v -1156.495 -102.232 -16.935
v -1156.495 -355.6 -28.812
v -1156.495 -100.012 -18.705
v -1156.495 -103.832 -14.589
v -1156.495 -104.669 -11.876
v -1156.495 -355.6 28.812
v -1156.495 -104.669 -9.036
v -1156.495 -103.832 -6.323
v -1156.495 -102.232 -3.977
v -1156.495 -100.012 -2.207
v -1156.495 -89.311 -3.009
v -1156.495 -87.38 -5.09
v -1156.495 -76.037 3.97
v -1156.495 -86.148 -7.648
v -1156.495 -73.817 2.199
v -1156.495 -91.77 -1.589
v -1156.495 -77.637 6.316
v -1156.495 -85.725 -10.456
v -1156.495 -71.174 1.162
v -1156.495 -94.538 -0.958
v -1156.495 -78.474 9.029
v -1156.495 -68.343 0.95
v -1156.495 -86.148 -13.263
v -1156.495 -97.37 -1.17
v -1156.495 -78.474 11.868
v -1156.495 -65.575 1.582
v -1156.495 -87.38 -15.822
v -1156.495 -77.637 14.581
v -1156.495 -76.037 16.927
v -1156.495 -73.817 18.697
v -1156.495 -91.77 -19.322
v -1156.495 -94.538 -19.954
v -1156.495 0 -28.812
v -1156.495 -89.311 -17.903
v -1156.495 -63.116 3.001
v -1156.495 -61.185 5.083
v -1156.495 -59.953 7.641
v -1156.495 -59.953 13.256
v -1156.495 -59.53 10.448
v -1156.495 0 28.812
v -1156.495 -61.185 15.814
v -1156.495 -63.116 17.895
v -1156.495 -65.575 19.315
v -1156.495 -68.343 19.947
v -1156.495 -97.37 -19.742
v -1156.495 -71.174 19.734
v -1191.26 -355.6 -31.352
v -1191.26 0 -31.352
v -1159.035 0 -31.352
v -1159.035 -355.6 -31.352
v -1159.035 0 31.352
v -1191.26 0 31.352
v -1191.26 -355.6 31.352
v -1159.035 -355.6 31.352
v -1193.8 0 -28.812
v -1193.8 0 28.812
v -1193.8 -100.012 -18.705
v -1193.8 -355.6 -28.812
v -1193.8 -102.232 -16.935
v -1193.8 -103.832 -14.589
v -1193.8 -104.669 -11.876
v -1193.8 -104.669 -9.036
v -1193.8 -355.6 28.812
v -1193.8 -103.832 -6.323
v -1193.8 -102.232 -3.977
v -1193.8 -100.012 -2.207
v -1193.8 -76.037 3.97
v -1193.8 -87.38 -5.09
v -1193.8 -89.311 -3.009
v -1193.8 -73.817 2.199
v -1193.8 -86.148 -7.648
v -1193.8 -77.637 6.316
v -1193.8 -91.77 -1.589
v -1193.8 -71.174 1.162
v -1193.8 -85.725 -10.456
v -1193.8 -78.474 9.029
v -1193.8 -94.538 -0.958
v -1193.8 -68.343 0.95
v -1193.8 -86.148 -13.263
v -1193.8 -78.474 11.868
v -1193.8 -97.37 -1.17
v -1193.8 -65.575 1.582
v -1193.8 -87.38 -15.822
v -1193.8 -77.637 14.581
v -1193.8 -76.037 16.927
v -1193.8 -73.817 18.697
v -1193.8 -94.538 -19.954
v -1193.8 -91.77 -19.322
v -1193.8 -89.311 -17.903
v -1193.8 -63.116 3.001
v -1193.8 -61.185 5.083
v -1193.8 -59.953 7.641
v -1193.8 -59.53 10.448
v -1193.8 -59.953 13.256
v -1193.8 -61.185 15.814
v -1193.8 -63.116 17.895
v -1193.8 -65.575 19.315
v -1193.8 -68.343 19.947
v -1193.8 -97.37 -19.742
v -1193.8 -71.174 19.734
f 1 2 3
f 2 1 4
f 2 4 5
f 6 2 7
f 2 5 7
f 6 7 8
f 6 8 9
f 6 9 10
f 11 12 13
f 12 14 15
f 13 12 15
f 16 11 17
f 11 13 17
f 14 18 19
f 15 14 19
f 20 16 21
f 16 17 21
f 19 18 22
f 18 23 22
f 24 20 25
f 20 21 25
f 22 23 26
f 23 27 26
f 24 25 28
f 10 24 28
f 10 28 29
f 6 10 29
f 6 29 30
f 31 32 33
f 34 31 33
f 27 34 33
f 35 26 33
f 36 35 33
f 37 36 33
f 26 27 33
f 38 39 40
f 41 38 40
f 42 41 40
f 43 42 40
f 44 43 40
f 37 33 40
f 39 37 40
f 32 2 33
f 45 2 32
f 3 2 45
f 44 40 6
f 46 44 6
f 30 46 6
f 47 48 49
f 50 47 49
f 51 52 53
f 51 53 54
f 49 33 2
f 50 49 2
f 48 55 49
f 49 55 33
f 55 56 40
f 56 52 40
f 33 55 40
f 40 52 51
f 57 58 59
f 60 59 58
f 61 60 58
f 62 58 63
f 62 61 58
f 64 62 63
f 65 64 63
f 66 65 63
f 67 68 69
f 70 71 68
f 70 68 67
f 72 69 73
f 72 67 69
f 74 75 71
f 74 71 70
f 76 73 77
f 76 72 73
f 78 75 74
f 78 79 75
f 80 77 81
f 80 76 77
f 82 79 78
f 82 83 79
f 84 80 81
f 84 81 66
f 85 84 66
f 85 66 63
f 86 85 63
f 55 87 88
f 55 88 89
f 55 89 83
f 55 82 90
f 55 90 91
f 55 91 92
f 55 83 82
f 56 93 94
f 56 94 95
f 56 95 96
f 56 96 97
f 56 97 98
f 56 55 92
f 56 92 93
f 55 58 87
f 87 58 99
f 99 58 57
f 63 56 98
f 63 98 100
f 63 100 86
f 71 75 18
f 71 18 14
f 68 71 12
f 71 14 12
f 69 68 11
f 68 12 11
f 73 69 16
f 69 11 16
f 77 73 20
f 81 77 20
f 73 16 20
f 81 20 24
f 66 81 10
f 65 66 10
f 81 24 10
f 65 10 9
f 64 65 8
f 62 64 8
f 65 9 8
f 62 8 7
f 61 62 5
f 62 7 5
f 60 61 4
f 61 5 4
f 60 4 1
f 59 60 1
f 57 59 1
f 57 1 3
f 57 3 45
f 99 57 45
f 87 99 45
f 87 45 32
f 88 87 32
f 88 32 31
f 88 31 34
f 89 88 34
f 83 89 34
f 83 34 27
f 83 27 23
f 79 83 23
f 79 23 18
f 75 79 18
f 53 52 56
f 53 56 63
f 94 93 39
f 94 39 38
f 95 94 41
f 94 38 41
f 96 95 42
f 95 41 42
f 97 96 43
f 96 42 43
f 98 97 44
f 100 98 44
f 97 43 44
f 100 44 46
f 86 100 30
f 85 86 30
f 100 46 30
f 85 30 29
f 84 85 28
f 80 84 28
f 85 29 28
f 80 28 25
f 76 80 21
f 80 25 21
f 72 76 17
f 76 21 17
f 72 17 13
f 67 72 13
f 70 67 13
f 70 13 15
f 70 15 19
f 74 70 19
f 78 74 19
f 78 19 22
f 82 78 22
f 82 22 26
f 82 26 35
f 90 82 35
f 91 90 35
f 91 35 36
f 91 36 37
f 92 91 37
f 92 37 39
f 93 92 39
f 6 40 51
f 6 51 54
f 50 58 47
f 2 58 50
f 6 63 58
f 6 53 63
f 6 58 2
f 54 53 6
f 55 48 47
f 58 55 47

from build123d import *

# Parameters (mm, degrees)
F0_W     = 37.30498
F0_H     = 62.70498
F1_DEPTH = 355.6
F3_D     = 19.05
F4_SIZE  = 2.54


with BuildPart() as f1:
    # F0 (on Front) → F1 (new body)
    with BuildSketch(Plane.XZ):
        with Locations((-1175.14751, 0)):
            Rectangle(F0_W, F0_H)
    extrude(amount=F1_DEPTH)

    # F3 (through all)
    with Locations(Plane(origin=(-1193.8, 0, 0), x_dir=(0, -1, 0), z_dir=(-1, 0, 0))):
        with Locations((69.05498, 10.44829), (95.25, -10.45591)):
            Hole(F3_D / 2)

    # F4
    f4_edges = [f1.edges().sort_by_distance(p)[0] for p in [
        (-1193.8, -177.8, 31.35249),
        (-1156.49502, -177.8, 31.35249),
        (-1193.8, -177.8, -31.35249),
        (-1156.49502, -177.8, -31.35249),
    ]]
    chamfer(f4_edges, length=F4_SIZE)


solid = f1.part
